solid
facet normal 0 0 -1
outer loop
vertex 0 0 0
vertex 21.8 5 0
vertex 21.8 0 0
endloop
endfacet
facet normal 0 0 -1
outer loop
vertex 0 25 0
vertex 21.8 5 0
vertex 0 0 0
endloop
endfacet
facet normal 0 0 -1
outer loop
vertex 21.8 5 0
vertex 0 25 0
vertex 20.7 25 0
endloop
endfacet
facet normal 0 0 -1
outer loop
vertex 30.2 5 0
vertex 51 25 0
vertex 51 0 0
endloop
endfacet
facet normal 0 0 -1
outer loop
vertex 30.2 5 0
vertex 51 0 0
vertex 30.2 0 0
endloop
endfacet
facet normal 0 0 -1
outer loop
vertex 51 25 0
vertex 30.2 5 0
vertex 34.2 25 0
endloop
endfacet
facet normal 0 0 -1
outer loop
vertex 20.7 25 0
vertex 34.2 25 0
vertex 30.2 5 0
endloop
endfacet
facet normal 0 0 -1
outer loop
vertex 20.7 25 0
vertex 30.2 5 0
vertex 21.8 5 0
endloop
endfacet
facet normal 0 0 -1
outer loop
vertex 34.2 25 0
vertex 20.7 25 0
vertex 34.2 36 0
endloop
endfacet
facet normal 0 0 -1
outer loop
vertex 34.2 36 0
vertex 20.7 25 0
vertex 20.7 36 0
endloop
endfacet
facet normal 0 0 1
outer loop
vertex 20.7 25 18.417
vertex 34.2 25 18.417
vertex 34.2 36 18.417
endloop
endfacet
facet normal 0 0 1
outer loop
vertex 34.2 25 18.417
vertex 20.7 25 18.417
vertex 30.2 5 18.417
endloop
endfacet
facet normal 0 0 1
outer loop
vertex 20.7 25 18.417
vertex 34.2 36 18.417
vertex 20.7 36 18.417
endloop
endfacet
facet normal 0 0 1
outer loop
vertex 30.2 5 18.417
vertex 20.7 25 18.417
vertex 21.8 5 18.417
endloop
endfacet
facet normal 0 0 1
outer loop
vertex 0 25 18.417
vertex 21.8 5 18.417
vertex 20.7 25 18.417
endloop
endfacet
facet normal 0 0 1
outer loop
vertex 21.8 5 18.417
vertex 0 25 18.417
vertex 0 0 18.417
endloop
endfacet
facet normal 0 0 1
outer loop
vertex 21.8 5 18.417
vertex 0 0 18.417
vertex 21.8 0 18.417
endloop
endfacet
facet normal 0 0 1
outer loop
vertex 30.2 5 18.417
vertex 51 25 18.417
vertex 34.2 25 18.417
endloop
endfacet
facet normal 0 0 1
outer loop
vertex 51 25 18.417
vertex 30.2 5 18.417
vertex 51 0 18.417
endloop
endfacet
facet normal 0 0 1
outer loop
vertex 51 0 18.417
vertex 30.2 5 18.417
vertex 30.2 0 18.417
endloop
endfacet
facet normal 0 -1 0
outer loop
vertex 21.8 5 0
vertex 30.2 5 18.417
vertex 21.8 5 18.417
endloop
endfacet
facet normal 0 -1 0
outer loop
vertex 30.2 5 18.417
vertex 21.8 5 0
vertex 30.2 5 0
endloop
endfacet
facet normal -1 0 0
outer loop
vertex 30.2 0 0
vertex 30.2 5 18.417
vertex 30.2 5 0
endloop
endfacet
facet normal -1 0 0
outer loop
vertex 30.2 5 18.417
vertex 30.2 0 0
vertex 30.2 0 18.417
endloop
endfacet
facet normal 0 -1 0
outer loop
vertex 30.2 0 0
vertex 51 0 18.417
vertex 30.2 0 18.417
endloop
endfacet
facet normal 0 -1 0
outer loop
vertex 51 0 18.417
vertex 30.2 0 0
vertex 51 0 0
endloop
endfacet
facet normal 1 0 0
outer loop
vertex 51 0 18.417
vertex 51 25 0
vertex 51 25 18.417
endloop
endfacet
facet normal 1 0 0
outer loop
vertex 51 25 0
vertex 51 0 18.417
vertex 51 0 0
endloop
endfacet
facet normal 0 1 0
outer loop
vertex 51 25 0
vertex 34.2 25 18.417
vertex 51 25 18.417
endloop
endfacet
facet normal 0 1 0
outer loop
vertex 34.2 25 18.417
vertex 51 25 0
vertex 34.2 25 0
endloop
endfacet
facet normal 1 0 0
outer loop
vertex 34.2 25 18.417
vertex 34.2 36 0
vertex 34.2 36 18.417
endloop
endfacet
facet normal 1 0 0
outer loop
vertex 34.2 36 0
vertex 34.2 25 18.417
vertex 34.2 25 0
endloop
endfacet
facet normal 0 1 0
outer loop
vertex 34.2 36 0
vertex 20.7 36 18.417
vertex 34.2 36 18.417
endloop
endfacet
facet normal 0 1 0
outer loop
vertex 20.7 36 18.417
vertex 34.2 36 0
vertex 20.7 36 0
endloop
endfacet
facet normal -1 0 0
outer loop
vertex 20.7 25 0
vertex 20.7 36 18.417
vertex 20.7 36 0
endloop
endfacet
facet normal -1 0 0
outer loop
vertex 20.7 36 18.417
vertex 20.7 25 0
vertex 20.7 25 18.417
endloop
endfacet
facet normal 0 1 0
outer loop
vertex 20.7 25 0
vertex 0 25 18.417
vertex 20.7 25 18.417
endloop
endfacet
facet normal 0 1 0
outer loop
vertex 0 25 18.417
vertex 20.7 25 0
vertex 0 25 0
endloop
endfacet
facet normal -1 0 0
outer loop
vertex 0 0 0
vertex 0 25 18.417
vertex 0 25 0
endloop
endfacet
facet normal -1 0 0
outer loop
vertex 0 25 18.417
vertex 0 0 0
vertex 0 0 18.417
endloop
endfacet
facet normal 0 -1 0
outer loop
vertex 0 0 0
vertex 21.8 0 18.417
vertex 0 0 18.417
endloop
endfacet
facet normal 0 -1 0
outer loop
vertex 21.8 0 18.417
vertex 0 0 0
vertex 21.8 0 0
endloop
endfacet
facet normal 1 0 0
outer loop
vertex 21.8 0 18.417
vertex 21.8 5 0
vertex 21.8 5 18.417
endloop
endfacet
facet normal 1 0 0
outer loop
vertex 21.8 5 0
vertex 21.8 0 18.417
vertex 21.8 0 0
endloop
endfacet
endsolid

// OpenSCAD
y1=0;
y2=5;
y3=25;
y4=25+11;
y_gable=-3;
x1=0;
x2=20.7;
x3=21.8;
gableExtraWidth=1;
x3_gable=x3-gableExtraWidth;
x4=x3 + 8.4;
x4_gable=x4+gableExtraWidth;
x5=x2+13.5;
x6=x5+16.8;
twoFloorHeight = 18 + 5/12;
peakHeight = twoFloorHeight+((y3-y1)/2 + 1)*6/12;
gableHeight = twoFloorHeight+((x4_gable-x3_gable)/2+1)*10/12;
backRoofHeight = twoFloorHeight+((x5-x2)/2+1)*6/12;

echo([x1,x2,x3,x4,x5,x6]);

// original structure
color("FireBrick")
linear_extrude(height = twoFloorHeight)
polygon(points = [[x1,y1], [x3,y1], [x3,y2], [x4,y2], [x4,y1], [x6,y1], [x6,y3], [x5,y3], [x5,y4], [x2,y4], [x2,y3], [x1,y3]], convexity=10);

color("LightGrey")
polyhedron(
    points = [
        [x1-1,y1-1,twoFloorHeight],
        [x3_gable-1,y1-1,twoFloorHeight],
        [x3_gable-1,y_gable,twoFloorHeight],
        [x4_gable+1,y_gable,twoFloorHeight],
        [x4_gable+1,y1-1,twoFloorHeight],
        [x6+1,y1-1,twoFloorHeight],
        [x6+1,y3+1,twoFloorHeight],
        [x5+1,y3+1,twoFloorHeight],
        [x5+1,y4+1,twoFloorHeight],
        [x2-1,y4+1,twoFloorHeight],
        [x2-1,y3+1,twoFloorHeight],
        /* 11 */ [x1-1,y3+1,twoFloorHeight],

        [x1+(y3-y1)/2,y1+(y3-y1)/2, peakHeight],
        [x6-(y3-y1)/2,y1+(y3-y1)/2, peakHeight],

        [(x3_gable+x4_gable)/2,y_gable, gableHeight],
        [(x3_gable+x4_gable)/2,y1+(y3/2) * (gableHeight-twoFloorHeight)/(peakHeight-twoFloorHeight), gableHeight],

        [(x2+x5)/2,y4, backRoofHeight],
        [(x2+x5)/2,y3-(y3/2) * (backRoofHeight-twoFloorHeight)/(peakHeight-twoFloorHeight), backRoofHeight],
    ],
    faces=[
        [0,1,2,3,4,5,6,7,8,9,10,11],
        [0,11,12],
        [5,6,13],
        [0,1,15,4,5,13,12],
        [6,7,17,10,11, 12,13],

        // gable
        [2,3,14],
        [1,2,14,15],
        [4,3,14,15],

        // back arch
        [7,8,16,17],
        [9,10,17,16],
        [8,9,16],
    ],
    convexity=10
);
